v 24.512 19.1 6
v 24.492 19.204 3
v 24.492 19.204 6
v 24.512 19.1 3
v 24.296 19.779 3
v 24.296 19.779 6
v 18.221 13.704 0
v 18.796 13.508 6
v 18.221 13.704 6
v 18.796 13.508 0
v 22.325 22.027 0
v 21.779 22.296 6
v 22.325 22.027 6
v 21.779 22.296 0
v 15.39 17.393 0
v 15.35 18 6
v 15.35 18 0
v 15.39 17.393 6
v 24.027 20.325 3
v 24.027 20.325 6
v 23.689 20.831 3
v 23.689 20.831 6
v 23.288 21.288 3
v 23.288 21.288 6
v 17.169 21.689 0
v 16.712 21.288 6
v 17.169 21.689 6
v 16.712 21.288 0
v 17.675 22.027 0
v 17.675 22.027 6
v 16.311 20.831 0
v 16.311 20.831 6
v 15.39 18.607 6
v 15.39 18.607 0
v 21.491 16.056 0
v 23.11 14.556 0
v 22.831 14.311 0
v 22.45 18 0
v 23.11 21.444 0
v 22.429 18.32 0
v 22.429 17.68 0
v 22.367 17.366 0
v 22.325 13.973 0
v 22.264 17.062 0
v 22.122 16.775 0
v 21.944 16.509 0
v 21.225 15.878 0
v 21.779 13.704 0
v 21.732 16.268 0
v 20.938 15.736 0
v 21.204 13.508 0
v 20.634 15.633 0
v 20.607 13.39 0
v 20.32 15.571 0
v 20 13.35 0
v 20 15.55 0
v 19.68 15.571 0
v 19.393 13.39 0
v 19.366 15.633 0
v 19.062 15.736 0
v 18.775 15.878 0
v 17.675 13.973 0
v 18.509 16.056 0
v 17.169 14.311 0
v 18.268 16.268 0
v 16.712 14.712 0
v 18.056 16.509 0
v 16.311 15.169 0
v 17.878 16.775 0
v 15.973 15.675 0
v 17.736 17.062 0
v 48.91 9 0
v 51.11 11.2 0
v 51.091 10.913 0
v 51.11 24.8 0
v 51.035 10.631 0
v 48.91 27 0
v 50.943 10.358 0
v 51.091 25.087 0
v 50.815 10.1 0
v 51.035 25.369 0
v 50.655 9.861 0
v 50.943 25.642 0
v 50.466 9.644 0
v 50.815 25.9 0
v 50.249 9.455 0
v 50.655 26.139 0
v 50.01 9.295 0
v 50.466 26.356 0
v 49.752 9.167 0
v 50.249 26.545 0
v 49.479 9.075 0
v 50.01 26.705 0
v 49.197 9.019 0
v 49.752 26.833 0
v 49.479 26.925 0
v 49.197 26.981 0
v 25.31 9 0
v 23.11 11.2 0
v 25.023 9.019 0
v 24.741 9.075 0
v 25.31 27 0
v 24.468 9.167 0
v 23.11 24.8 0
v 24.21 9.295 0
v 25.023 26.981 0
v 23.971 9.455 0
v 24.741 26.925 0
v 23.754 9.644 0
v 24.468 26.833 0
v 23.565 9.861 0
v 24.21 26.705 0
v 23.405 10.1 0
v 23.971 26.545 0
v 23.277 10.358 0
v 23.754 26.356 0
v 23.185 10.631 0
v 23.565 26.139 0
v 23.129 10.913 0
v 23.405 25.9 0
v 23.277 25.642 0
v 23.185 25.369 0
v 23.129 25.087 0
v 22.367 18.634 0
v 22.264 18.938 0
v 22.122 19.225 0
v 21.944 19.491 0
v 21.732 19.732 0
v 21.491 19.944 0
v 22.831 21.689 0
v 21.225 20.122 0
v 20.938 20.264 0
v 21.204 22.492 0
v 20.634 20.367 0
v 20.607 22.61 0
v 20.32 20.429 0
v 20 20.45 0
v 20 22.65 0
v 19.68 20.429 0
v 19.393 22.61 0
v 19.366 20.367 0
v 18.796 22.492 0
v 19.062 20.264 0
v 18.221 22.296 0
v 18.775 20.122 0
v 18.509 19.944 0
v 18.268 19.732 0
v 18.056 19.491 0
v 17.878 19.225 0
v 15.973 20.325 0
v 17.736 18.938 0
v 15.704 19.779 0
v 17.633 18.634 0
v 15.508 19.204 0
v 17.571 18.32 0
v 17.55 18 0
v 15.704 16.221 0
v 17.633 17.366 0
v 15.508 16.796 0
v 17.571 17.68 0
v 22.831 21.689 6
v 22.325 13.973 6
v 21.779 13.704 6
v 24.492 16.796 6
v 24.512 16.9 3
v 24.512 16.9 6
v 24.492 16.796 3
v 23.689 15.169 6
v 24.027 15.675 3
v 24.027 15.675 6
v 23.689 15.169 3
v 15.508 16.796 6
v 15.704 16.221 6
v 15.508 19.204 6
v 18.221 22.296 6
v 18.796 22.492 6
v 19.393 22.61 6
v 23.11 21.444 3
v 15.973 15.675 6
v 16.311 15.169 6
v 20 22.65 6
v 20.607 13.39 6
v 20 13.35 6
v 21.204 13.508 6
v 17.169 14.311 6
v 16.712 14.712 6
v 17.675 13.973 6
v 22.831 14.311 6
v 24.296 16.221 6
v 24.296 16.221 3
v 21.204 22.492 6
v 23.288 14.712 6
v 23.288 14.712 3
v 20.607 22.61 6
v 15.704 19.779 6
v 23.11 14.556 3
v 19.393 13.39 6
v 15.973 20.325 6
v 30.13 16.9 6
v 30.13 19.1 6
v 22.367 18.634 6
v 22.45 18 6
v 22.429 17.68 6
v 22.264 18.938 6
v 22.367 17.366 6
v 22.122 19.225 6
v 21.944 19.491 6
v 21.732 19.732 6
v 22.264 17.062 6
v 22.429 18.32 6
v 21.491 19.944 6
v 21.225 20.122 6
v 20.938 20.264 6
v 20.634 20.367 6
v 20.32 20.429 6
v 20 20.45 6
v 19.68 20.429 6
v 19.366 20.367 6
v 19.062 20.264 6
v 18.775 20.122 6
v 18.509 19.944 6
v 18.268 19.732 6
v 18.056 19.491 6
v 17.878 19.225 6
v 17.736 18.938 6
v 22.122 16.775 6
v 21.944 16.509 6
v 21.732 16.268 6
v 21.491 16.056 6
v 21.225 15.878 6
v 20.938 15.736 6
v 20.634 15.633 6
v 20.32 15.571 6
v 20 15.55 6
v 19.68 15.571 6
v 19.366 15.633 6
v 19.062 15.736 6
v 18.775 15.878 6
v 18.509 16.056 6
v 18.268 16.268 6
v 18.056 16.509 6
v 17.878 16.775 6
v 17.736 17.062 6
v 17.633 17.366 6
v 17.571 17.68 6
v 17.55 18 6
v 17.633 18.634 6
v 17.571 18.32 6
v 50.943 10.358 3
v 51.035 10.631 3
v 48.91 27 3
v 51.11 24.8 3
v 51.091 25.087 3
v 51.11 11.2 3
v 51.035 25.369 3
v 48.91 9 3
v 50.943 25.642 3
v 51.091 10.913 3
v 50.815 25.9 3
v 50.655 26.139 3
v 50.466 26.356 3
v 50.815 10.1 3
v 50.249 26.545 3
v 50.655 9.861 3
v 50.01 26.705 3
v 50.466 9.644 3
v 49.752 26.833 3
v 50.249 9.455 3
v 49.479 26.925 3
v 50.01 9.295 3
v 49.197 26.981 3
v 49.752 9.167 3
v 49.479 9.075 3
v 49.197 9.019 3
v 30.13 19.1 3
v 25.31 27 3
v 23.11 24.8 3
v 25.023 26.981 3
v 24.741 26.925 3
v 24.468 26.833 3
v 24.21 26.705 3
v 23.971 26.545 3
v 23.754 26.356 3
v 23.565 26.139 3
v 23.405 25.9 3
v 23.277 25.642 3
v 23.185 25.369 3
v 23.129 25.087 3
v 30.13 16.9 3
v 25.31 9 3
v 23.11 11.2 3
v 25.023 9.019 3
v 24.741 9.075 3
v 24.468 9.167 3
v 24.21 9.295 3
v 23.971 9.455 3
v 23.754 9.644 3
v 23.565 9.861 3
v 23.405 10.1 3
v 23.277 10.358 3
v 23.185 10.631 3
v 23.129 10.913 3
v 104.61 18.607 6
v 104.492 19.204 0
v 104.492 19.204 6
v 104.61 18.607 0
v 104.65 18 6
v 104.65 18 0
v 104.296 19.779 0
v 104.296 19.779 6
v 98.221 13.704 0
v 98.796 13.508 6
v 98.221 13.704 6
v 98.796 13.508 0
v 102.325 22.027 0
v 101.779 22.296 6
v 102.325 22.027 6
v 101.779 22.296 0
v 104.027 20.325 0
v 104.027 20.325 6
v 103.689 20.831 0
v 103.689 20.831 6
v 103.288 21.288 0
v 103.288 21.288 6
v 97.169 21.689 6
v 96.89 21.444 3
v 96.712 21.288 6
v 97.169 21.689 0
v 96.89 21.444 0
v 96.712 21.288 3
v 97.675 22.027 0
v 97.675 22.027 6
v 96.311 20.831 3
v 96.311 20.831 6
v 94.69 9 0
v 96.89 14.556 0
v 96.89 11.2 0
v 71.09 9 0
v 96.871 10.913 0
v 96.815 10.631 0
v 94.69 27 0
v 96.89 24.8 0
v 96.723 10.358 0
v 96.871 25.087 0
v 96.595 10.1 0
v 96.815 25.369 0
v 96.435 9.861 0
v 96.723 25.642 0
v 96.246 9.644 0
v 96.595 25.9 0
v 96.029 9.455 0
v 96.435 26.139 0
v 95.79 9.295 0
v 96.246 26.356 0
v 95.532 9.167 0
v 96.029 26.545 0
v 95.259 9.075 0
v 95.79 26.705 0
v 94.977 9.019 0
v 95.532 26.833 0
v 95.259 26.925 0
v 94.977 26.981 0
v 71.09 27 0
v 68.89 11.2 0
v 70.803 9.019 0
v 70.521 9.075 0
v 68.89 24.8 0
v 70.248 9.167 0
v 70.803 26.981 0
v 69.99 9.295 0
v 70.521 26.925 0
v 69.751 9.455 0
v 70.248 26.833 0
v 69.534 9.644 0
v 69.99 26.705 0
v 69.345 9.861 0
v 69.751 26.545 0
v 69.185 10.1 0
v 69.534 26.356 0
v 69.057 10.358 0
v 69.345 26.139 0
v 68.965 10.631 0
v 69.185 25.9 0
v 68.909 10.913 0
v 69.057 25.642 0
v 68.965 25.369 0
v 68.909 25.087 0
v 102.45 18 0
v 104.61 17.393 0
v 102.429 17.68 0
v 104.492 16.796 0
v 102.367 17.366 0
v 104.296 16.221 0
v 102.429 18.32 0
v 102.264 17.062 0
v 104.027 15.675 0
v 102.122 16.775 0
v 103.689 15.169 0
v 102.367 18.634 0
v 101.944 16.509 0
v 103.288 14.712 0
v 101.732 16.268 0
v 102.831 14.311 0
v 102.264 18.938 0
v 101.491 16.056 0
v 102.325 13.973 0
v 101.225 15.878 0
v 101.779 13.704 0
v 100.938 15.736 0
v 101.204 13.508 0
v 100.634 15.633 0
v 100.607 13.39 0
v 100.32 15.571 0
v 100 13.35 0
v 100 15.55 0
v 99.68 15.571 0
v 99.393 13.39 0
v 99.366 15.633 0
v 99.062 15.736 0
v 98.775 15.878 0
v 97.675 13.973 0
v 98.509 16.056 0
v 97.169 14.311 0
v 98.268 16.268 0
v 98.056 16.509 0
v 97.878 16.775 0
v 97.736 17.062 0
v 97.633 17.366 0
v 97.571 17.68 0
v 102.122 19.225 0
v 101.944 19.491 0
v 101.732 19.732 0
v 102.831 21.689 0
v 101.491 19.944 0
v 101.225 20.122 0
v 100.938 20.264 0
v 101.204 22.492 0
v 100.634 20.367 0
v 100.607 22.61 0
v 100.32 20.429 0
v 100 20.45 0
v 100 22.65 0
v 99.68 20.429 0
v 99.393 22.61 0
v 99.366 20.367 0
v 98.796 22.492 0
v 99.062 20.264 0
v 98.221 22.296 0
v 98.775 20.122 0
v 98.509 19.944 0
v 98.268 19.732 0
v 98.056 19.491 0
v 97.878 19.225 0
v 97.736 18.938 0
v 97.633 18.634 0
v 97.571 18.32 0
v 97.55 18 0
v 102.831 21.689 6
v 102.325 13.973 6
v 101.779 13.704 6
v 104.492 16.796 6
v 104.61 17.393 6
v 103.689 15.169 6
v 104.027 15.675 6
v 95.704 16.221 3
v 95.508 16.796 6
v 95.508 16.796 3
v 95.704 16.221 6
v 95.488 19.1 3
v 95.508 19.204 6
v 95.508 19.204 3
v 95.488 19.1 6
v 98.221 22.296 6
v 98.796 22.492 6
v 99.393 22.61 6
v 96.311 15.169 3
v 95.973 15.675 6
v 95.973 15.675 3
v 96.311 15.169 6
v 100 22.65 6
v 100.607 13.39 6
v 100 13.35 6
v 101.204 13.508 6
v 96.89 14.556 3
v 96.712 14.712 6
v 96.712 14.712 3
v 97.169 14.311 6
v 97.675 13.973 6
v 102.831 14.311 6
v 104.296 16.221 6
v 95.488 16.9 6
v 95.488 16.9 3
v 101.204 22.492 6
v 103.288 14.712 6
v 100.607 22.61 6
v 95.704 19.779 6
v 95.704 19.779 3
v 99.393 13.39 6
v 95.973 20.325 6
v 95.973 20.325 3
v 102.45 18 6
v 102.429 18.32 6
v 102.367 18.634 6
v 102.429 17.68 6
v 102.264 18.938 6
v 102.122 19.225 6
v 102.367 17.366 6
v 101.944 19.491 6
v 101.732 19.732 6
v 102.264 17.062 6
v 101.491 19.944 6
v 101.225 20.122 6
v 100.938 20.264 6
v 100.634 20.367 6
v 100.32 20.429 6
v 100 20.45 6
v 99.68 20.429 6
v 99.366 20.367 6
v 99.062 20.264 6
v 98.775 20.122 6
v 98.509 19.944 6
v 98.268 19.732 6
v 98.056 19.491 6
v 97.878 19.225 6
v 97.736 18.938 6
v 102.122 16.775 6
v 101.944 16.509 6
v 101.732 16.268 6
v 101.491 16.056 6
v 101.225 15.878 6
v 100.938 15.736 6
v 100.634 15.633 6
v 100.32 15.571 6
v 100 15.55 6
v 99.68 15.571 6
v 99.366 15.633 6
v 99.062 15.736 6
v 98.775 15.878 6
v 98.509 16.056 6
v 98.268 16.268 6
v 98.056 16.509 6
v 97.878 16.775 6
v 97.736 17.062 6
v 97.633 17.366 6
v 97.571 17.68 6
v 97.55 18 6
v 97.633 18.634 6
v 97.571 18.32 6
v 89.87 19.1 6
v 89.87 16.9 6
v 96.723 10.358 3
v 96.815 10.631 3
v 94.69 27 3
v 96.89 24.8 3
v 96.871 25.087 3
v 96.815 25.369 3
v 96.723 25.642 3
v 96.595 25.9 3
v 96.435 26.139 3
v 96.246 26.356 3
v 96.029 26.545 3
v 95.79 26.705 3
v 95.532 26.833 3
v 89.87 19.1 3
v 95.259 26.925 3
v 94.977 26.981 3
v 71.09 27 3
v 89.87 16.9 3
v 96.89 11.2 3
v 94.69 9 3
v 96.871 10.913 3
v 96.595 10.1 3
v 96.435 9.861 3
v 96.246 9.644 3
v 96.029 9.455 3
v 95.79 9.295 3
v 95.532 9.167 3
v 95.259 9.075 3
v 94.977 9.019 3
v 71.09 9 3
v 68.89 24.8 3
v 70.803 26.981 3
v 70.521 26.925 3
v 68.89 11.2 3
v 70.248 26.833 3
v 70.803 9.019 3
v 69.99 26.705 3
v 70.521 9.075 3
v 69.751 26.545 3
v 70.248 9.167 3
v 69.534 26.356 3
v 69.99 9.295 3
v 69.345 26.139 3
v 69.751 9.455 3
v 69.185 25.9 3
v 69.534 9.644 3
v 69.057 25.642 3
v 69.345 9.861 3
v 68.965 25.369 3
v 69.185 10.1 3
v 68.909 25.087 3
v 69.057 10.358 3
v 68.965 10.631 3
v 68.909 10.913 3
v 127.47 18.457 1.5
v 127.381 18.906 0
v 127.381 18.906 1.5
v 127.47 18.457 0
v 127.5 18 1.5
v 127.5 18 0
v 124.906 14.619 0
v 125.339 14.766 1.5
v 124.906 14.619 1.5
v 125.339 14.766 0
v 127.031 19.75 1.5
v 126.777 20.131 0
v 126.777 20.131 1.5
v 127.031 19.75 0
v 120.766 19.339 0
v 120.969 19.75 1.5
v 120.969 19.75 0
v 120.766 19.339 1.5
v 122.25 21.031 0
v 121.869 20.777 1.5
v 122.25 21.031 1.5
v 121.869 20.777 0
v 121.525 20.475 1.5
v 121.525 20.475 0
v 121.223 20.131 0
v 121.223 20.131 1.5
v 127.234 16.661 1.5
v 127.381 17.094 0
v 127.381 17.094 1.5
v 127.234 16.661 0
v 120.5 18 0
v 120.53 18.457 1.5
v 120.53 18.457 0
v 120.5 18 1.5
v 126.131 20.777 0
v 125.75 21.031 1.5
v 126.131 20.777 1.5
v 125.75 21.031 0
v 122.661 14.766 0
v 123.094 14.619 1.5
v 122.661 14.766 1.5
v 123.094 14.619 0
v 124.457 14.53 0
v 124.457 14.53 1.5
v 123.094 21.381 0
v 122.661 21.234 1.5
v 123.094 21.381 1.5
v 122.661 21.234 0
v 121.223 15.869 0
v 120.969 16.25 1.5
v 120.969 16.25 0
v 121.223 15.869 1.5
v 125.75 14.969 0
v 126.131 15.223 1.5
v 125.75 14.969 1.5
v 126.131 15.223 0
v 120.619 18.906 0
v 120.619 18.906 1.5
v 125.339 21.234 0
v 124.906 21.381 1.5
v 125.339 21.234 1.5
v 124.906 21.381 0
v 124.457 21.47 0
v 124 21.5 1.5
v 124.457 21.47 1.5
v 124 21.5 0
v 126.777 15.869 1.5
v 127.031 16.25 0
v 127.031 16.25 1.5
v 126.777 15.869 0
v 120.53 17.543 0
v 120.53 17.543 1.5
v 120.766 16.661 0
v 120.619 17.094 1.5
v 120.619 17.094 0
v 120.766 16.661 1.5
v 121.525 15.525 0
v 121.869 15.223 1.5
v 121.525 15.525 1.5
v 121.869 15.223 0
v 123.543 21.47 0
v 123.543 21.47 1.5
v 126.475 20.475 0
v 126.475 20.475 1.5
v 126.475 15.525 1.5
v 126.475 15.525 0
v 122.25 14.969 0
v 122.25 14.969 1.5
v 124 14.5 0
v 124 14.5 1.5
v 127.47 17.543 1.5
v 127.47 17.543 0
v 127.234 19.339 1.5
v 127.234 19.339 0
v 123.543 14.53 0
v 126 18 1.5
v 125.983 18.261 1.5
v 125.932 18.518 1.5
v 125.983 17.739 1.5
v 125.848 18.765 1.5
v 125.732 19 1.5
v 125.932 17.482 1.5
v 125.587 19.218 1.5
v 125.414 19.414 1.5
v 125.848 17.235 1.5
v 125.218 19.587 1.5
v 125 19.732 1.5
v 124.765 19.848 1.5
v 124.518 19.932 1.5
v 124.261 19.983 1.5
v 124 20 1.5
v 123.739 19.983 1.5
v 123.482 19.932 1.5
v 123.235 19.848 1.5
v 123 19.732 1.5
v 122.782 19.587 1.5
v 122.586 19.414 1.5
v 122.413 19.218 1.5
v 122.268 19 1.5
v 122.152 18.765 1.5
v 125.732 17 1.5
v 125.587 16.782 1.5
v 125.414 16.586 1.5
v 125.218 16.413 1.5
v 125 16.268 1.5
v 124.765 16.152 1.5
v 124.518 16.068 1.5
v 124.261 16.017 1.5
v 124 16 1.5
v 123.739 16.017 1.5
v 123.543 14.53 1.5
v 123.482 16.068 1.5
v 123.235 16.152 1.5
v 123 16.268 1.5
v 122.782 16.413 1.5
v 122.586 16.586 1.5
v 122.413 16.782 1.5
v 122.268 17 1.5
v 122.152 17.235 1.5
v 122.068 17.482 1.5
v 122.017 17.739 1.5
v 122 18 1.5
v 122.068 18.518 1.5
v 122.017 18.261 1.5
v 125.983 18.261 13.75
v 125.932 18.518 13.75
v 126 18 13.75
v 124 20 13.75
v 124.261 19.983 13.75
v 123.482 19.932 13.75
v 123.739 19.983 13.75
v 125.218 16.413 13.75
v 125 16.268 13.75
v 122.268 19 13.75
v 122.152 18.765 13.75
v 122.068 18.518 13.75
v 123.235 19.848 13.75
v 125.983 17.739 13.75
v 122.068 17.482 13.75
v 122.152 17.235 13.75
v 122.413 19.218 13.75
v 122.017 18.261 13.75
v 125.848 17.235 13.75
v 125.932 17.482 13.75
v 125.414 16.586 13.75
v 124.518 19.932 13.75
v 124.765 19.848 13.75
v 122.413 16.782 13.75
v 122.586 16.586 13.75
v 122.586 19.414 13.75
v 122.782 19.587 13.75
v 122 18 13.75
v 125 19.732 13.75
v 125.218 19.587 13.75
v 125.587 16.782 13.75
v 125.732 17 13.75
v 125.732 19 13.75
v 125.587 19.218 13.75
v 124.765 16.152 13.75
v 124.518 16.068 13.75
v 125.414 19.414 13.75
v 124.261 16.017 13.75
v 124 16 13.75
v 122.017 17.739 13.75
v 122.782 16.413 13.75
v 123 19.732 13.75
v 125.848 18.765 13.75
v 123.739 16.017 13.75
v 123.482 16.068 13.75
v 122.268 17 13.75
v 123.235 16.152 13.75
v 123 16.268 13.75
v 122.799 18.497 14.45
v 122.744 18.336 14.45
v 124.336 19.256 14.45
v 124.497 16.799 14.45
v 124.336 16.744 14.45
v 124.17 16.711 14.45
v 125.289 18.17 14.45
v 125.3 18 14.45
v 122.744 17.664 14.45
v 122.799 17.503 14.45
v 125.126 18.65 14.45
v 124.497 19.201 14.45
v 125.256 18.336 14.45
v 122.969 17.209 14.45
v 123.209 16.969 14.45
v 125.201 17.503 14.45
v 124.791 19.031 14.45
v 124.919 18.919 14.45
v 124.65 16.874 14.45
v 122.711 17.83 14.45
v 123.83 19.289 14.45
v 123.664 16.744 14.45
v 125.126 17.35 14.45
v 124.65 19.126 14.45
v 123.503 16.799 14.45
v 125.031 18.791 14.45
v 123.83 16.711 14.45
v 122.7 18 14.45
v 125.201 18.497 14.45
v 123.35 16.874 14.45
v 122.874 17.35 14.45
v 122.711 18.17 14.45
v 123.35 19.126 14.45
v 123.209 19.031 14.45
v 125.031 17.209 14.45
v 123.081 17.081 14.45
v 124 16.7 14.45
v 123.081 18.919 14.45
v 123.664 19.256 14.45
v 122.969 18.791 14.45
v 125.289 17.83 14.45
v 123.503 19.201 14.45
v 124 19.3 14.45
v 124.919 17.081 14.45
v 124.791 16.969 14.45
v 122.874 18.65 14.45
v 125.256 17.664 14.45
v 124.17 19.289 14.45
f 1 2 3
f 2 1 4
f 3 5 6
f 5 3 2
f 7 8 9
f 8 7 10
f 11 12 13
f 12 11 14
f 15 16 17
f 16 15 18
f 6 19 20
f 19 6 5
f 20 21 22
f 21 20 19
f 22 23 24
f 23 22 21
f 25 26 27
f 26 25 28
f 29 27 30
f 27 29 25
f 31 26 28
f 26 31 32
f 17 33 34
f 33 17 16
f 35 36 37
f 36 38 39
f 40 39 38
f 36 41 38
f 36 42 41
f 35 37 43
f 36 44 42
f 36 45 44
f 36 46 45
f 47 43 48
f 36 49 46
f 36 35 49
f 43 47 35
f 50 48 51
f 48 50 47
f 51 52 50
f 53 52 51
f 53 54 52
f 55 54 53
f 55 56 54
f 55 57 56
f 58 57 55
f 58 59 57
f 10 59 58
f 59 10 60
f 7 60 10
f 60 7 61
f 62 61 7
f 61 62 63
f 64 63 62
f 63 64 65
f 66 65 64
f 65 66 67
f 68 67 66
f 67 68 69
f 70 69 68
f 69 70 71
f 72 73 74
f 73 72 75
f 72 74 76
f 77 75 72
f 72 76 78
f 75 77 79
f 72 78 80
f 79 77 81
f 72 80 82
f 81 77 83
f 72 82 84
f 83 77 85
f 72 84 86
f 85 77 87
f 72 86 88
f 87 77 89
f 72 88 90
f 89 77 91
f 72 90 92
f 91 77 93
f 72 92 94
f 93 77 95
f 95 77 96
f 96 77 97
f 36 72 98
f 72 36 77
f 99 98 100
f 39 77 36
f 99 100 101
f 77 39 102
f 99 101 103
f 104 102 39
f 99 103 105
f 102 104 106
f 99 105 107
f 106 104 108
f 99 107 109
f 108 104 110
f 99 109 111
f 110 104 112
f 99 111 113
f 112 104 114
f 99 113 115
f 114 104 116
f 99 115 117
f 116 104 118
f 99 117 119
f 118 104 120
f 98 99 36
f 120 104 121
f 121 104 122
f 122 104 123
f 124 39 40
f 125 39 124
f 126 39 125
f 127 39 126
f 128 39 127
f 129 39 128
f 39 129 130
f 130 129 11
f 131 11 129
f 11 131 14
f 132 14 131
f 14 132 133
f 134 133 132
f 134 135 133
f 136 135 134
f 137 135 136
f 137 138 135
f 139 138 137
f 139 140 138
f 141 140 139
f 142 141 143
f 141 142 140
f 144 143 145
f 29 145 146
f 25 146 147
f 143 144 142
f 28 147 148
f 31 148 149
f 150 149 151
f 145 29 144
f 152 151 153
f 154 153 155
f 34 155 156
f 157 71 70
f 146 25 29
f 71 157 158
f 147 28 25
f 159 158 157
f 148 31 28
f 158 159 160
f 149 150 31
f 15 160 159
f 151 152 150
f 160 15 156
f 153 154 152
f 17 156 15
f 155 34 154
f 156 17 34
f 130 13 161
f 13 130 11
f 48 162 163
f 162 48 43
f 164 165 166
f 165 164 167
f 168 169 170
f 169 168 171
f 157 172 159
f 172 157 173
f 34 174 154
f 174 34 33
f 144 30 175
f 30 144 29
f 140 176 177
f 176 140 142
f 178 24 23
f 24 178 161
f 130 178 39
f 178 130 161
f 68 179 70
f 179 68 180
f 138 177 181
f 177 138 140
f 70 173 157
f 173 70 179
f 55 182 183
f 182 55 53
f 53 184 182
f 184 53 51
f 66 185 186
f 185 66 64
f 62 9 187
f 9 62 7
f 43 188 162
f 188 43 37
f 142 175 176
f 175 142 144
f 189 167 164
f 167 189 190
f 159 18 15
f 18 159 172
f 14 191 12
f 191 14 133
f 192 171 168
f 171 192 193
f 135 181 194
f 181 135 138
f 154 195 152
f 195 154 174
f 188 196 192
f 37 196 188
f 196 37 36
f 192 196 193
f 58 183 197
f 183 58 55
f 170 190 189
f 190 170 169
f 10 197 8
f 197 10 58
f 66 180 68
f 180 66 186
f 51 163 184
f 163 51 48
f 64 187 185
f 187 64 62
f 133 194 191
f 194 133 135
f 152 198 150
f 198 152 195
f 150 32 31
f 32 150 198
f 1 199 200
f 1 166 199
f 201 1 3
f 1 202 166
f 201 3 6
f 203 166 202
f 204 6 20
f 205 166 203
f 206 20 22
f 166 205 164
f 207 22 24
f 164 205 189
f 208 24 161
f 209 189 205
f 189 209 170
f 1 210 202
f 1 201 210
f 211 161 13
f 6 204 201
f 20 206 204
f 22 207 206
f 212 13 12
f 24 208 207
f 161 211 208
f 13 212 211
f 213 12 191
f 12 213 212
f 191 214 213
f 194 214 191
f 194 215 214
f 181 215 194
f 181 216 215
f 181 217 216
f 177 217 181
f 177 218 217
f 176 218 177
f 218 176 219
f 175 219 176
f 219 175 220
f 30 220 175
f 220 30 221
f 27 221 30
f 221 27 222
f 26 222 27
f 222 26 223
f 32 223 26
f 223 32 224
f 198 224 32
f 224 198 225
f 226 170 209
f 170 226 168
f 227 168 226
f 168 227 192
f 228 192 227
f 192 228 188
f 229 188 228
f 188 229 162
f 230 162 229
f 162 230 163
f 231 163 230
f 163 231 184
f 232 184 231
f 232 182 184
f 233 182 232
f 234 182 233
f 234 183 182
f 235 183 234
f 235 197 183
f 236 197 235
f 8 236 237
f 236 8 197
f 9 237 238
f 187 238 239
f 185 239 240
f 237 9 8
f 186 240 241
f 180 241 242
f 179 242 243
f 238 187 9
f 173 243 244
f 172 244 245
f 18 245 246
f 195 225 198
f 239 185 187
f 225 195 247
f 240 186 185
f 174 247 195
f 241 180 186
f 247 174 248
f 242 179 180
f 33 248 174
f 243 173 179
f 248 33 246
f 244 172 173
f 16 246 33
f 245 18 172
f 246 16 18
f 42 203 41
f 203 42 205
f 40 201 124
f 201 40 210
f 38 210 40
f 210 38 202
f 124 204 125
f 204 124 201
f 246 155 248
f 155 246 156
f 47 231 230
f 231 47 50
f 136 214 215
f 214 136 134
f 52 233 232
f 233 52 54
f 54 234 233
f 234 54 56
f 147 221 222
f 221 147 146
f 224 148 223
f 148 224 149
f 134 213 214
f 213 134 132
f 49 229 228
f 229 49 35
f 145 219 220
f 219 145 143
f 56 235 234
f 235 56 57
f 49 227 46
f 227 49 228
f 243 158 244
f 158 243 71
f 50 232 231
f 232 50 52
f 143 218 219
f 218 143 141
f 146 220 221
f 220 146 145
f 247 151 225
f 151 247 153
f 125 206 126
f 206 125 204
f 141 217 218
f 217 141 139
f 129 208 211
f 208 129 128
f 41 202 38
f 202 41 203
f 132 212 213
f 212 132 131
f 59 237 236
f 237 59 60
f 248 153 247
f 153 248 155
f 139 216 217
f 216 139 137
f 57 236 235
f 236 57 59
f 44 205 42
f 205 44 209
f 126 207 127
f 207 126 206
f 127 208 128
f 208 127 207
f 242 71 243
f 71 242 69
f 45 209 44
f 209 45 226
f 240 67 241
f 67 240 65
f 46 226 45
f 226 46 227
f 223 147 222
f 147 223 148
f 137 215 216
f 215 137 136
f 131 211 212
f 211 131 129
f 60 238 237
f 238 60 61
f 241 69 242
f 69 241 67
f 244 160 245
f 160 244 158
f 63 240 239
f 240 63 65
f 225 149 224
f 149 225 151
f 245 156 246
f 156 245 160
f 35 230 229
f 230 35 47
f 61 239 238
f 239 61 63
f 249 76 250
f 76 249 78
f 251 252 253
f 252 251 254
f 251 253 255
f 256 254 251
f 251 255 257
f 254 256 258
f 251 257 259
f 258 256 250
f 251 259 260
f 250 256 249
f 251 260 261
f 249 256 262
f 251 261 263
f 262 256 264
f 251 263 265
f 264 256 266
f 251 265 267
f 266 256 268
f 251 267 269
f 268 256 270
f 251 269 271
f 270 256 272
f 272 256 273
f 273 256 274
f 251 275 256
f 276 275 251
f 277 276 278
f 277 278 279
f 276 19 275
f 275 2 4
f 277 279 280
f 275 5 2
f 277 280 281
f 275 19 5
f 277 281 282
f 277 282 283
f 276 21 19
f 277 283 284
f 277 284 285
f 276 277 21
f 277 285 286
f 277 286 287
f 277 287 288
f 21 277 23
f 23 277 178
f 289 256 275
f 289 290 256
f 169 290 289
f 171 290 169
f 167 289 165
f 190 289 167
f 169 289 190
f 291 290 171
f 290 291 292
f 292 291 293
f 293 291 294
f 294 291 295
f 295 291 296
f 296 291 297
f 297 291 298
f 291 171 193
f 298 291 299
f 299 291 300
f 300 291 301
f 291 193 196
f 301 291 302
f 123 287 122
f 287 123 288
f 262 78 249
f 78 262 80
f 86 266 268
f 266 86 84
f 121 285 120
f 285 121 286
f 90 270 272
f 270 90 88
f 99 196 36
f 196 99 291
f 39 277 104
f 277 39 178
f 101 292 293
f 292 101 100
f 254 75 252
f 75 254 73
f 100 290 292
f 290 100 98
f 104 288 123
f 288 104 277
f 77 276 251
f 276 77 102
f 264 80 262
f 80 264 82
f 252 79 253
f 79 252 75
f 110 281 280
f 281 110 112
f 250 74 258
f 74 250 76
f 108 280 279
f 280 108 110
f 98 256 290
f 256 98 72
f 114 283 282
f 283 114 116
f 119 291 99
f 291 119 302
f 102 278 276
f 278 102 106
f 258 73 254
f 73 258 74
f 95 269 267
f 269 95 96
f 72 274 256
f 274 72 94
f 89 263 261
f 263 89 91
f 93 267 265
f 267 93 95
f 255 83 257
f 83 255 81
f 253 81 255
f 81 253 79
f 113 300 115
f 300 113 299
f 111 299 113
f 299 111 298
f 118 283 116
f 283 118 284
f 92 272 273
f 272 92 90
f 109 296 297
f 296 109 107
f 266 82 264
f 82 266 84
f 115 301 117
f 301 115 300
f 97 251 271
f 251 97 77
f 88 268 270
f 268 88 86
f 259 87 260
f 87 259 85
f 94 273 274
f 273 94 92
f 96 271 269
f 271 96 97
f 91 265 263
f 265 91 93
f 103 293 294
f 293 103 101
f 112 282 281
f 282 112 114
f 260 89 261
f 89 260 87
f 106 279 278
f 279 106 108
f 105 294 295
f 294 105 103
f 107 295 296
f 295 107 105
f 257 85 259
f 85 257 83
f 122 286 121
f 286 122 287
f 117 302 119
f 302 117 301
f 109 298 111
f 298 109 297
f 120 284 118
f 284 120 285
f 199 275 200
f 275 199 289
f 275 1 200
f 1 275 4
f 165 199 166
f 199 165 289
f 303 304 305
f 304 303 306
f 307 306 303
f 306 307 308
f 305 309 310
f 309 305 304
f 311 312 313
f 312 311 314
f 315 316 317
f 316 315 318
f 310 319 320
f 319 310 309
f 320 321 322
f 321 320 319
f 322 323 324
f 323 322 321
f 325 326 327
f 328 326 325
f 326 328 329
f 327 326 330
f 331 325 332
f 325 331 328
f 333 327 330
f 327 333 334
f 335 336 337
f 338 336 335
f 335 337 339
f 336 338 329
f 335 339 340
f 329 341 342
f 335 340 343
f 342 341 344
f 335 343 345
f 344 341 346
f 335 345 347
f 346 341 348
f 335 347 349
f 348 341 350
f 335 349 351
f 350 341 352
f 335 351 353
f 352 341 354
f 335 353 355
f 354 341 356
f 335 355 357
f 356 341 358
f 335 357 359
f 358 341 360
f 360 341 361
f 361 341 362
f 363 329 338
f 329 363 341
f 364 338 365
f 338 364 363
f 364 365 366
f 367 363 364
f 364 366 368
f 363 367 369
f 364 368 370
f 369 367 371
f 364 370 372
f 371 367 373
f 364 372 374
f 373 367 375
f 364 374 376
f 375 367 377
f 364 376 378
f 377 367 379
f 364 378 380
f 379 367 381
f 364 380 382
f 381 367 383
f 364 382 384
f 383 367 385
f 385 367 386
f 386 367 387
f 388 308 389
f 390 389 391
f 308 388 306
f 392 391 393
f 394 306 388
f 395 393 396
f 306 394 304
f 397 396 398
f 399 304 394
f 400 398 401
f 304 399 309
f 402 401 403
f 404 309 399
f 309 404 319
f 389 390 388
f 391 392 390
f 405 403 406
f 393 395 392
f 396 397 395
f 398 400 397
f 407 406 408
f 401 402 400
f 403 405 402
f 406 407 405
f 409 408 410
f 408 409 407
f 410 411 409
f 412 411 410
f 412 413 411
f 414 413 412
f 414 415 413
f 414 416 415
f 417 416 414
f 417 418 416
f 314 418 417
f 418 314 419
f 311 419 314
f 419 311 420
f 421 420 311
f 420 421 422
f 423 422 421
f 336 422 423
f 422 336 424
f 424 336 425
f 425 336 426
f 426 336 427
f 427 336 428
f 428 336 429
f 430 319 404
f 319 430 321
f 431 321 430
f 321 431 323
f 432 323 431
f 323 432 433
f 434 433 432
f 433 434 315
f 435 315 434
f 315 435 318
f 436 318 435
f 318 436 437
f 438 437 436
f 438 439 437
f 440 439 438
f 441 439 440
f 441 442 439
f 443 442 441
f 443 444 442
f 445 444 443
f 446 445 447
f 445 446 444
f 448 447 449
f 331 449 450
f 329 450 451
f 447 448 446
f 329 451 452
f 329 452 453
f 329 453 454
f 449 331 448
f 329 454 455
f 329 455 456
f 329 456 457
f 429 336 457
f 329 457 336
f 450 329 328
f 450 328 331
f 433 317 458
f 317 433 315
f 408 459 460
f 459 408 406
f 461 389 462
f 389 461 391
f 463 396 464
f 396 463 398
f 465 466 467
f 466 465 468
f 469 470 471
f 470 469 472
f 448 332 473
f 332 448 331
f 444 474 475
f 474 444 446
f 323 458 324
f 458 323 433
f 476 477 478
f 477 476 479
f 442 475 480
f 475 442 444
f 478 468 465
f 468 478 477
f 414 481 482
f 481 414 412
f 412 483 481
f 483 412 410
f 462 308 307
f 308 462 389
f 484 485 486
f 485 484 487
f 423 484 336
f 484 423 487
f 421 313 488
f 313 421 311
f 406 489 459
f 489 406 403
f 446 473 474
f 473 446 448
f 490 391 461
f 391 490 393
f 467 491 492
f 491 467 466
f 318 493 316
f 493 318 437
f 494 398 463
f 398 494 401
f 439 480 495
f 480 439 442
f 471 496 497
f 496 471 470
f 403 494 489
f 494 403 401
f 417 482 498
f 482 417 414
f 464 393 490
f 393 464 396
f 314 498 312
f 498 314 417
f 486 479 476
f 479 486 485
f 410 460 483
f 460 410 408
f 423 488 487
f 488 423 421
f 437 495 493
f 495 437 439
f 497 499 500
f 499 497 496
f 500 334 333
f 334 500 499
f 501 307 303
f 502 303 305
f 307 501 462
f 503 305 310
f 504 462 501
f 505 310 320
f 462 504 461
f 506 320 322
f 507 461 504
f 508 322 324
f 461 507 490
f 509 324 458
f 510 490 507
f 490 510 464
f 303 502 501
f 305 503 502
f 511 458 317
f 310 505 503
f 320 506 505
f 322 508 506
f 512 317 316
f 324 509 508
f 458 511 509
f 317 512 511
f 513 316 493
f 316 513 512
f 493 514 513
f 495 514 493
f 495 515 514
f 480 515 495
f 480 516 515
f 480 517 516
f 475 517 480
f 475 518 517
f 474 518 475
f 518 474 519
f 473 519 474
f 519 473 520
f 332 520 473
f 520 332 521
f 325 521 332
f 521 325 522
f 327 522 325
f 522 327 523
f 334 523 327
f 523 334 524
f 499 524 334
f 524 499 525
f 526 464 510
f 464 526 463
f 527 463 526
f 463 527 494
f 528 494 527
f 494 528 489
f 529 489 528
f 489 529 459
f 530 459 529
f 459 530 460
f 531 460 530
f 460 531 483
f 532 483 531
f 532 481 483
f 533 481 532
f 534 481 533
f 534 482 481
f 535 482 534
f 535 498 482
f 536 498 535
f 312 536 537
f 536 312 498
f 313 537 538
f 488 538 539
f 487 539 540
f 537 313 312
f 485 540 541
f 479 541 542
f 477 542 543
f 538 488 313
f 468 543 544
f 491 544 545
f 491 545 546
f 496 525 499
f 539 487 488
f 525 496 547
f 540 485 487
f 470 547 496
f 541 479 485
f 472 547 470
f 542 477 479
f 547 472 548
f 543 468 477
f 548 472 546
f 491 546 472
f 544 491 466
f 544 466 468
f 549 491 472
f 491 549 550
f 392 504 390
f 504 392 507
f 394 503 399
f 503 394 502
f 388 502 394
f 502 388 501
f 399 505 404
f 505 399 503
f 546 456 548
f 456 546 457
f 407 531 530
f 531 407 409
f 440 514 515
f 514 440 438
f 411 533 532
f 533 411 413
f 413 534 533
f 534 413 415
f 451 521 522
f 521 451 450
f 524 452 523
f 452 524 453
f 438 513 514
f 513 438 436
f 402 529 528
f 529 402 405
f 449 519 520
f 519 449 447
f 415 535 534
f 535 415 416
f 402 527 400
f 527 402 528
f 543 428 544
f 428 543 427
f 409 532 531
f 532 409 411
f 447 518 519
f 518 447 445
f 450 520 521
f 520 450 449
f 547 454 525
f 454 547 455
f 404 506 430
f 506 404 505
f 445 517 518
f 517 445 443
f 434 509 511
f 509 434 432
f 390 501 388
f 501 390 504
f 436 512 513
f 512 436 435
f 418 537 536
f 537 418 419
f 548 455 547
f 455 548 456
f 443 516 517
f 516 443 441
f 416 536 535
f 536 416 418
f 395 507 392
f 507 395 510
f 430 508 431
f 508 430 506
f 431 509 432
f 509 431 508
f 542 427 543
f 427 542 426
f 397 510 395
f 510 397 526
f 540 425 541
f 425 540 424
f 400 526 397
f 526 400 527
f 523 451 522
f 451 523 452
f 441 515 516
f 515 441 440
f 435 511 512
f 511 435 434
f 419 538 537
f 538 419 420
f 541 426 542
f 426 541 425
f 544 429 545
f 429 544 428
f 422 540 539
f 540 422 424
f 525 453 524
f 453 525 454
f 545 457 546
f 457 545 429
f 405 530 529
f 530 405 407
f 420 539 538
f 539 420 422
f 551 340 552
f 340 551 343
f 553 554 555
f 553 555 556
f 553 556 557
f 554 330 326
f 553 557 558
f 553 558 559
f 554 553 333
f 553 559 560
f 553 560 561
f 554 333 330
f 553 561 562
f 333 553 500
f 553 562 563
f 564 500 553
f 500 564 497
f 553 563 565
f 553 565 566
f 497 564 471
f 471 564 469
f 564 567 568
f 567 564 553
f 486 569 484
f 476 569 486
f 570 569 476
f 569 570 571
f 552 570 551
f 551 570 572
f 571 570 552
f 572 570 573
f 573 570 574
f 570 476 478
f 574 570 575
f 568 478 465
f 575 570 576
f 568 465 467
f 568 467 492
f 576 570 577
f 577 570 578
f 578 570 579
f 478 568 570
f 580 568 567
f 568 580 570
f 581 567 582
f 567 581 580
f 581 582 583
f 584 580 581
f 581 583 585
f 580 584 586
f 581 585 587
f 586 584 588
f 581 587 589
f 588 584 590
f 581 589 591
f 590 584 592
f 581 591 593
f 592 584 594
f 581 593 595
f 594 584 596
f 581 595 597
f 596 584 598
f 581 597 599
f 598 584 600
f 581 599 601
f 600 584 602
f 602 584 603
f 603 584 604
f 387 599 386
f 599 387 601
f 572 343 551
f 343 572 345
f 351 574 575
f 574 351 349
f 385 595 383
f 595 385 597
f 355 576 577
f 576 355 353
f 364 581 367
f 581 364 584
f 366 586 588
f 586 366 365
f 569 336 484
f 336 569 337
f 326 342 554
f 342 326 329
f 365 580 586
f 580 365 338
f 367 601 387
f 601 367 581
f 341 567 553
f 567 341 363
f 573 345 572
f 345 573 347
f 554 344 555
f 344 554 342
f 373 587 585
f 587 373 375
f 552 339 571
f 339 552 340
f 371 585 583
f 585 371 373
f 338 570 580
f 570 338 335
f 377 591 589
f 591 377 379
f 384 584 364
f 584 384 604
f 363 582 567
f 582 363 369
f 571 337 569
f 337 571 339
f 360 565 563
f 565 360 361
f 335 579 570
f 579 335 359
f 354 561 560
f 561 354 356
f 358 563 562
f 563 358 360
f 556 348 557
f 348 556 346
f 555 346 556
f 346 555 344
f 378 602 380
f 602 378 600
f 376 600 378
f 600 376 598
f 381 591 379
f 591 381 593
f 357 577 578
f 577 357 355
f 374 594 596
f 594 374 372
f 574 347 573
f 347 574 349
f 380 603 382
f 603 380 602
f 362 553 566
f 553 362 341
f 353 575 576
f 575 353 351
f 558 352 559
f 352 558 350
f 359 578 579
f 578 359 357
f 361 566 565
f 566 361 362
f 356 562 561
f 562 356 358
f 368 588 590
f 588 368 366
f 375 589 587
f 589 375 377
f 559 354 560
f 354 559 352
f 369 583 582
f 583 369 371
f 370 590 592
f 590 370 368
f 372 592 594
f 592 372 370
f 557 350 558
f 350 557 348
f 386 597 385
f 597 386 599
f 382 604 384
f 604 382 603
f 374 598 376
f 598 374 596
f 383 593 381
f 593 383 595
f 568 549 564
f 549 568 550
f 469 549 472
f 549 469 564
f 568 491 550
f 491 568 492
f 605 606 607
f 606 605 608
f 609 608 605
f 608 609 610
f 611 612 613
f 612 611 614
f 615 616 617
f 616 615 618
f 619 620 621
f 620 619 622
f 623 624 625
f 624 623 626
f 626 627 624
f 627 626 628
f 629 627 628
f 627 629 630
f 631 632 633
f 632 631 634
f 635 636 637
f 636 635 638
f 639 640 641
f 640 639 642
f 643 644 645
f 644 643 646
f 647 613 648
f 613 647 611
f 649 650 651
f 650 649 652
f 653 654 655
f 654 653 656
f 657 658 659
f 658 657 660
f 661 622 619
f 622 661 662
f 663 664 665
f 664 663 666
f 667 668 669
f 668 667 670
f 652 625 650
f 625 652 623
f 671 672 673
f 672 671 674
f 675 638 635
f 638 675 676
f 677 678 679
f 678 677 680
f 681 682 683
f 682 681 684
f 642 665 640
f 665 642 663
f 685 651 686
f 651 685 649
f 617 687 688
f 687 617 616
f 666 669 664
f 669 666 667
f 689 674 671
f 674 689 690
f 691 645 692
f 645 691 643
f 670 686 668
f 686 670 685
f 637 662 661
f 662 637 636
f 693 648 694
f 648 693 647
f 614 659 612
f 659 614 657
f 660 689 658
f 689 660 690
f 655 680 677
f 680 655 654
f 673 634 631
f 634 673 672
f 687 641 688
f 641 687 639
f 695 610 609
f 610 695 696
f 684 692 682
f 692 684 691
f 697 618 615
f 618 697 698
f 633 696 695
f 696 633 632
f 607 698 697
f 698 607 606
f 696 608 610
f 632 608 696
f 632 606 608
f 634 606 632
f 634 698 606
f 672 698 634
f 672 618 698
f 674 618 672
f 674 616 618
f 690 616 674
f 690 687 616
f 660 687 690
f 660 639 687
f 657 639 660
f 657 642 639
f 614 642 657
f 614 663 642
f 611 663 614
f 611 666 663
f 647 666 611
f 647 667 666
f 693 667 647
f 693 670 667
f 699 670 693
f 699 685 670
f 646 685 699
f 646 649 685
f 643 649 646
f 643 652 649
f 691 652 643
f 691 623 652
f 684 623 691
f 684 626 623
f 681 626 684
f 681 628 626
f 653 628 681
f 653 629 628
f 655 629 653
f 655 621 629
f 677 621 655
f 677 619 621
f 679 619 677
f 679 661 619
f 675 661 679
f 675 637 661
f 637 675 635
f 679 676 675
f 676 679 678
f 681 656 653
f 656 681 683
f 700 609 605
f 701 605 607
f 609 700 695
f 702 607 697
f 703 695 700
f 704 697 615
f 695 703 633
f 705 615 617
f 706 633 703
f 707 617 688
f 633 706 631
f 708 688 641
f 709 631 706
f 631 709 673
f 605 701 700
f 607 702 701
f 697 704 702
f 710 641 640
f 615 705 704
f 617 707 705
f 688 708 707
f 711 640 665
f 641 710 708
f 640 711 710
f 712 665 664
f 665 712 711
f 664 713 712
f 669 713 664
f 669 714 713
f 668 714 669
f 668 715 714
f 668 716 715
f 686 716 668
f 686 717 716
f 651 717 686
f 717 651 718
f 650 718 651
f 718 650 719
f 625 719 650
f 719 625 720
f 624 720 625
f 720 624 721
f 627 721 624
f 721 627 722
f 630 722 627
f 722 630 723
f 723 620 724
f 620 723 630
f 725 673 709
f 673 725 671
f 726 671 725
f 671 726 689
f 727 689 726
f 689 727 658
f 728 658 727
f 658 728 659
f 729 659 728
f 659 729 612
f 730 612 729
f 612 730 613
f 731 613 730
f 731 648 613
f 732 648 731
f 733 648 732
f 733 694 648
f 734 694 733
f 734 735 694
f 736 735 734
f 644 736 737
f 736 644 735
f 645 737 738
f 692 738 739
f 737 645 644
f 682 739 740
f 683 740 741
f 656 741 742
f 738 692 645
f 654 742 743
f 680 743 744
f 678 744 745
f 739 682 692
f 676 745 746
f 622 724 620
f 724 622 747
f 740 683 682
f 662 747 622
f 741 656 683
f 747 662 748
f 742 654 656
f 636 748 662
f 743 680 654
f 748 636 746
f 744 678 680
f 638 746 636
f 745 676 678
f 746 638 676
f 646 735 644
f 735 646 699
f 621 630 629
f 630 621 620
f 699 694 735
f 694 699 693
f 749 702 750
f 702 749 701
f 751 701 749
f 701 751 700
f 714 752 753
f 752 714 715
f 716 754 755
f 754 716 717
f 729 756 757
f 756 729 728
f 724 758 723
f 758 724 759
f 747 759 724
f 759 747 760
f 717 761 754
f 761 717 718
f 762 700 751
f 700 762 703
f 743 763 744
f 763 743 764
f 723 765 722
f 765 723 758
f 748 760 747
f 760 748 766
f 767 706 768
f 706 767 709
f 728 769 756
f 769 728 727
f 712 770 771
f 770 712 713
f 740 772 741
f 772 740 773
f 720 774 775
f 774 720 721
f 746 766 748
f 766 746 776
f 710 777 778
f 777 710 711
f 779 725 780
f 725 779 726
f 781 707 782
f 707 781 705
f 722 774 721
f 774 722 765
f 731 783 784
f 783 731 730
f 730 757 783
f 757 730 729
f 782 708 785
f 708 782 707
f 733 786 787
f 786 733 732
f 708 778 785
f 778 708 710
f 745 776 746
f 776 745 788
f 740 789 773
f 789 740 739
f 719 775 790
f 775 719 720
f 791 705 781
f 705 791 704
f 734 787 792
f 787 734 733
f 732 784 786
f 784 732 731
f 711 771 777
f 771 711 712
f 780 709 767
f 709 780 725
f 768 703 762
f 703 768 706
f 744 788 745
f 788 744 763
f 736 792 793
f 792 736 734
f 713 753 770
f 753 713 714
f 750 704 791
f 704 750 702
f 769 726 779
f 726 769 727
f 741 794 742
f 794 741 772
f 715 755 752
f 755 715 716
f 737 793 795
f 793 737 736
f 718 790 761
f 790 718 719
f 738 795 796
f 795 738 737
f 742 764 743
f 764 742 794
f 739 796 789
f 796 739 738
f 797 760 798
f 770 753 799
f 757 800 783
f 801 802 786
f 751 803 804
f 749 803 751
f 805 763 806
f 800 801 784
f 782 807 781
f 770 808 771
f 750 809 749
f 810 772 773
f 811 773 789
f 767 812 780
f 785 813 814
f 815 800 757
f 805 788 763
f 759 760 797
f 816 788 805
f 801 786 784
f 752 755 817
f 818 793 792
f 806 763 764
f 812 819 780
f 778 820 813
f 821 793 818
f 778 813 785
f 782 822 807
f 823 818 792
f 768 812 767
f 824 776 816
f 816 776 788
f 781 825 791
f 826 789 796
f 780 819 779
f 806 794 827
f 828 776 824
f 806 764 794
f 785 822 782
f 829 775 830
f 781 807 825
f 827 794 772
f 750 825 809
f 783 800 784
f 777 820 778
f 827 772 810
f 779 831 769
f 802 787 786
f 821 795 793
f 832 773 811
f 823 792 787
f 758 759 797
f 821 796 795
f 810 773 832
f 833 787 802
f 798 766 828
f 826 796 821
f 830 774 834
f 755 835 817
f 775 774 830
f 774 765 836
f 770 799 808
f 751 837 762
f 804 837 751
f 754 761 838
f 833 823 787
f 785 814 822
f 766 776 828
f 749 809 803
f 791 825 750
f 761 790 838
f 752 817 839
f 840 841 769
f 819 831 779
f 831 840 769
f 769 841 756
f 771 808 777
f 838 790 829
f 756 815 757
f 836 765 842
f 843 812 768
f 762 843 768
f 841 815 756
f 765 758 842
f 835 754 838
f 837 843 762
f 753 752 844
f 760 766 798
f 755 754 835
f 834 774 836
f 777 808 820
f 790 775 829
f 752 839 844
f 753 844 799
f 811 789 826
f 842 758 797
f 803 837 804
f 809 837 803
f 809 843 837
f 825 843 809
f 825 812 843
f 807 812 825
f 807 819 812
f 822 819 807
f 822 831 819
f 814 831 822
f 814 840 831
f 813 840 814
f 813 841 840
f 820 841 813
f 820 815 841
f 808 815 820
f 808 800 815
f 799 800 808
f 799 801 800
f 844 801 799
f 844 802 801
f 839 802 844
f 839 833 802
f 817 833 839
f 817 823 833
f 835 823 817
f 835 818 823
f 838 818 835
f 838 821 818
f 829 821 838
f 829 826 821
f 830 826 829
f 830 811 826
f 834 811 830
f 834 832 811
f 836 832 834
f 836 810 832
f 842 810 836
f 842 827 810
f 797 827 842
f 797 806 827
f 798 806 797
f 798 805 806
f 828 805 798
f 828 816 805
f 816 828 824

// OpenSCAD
/*
Sample 004: Versetztes Stiftgelenk — schmutztolerant
Generated from the FDM Mechanical Sample Library.
Units: millimetres.

Override examples:
  openscad -o custom.stl -D 'view="plate"' -D 'render_fn=64' model.scad
  openscad -o preview.png -D 'view="assembly"' model.scad
*/
use <../../../library/fdm_mechanisms.scad>

render_fn = is_undef(render_fn) ? 48 : render_fn;
view = is_undef(view) ? "plate" : view;
$fn = render_fn;

sample_pin_hinge(
    view=view,
    clearance=0.45,
    pin_d=4,
    leaf_l=28
);
